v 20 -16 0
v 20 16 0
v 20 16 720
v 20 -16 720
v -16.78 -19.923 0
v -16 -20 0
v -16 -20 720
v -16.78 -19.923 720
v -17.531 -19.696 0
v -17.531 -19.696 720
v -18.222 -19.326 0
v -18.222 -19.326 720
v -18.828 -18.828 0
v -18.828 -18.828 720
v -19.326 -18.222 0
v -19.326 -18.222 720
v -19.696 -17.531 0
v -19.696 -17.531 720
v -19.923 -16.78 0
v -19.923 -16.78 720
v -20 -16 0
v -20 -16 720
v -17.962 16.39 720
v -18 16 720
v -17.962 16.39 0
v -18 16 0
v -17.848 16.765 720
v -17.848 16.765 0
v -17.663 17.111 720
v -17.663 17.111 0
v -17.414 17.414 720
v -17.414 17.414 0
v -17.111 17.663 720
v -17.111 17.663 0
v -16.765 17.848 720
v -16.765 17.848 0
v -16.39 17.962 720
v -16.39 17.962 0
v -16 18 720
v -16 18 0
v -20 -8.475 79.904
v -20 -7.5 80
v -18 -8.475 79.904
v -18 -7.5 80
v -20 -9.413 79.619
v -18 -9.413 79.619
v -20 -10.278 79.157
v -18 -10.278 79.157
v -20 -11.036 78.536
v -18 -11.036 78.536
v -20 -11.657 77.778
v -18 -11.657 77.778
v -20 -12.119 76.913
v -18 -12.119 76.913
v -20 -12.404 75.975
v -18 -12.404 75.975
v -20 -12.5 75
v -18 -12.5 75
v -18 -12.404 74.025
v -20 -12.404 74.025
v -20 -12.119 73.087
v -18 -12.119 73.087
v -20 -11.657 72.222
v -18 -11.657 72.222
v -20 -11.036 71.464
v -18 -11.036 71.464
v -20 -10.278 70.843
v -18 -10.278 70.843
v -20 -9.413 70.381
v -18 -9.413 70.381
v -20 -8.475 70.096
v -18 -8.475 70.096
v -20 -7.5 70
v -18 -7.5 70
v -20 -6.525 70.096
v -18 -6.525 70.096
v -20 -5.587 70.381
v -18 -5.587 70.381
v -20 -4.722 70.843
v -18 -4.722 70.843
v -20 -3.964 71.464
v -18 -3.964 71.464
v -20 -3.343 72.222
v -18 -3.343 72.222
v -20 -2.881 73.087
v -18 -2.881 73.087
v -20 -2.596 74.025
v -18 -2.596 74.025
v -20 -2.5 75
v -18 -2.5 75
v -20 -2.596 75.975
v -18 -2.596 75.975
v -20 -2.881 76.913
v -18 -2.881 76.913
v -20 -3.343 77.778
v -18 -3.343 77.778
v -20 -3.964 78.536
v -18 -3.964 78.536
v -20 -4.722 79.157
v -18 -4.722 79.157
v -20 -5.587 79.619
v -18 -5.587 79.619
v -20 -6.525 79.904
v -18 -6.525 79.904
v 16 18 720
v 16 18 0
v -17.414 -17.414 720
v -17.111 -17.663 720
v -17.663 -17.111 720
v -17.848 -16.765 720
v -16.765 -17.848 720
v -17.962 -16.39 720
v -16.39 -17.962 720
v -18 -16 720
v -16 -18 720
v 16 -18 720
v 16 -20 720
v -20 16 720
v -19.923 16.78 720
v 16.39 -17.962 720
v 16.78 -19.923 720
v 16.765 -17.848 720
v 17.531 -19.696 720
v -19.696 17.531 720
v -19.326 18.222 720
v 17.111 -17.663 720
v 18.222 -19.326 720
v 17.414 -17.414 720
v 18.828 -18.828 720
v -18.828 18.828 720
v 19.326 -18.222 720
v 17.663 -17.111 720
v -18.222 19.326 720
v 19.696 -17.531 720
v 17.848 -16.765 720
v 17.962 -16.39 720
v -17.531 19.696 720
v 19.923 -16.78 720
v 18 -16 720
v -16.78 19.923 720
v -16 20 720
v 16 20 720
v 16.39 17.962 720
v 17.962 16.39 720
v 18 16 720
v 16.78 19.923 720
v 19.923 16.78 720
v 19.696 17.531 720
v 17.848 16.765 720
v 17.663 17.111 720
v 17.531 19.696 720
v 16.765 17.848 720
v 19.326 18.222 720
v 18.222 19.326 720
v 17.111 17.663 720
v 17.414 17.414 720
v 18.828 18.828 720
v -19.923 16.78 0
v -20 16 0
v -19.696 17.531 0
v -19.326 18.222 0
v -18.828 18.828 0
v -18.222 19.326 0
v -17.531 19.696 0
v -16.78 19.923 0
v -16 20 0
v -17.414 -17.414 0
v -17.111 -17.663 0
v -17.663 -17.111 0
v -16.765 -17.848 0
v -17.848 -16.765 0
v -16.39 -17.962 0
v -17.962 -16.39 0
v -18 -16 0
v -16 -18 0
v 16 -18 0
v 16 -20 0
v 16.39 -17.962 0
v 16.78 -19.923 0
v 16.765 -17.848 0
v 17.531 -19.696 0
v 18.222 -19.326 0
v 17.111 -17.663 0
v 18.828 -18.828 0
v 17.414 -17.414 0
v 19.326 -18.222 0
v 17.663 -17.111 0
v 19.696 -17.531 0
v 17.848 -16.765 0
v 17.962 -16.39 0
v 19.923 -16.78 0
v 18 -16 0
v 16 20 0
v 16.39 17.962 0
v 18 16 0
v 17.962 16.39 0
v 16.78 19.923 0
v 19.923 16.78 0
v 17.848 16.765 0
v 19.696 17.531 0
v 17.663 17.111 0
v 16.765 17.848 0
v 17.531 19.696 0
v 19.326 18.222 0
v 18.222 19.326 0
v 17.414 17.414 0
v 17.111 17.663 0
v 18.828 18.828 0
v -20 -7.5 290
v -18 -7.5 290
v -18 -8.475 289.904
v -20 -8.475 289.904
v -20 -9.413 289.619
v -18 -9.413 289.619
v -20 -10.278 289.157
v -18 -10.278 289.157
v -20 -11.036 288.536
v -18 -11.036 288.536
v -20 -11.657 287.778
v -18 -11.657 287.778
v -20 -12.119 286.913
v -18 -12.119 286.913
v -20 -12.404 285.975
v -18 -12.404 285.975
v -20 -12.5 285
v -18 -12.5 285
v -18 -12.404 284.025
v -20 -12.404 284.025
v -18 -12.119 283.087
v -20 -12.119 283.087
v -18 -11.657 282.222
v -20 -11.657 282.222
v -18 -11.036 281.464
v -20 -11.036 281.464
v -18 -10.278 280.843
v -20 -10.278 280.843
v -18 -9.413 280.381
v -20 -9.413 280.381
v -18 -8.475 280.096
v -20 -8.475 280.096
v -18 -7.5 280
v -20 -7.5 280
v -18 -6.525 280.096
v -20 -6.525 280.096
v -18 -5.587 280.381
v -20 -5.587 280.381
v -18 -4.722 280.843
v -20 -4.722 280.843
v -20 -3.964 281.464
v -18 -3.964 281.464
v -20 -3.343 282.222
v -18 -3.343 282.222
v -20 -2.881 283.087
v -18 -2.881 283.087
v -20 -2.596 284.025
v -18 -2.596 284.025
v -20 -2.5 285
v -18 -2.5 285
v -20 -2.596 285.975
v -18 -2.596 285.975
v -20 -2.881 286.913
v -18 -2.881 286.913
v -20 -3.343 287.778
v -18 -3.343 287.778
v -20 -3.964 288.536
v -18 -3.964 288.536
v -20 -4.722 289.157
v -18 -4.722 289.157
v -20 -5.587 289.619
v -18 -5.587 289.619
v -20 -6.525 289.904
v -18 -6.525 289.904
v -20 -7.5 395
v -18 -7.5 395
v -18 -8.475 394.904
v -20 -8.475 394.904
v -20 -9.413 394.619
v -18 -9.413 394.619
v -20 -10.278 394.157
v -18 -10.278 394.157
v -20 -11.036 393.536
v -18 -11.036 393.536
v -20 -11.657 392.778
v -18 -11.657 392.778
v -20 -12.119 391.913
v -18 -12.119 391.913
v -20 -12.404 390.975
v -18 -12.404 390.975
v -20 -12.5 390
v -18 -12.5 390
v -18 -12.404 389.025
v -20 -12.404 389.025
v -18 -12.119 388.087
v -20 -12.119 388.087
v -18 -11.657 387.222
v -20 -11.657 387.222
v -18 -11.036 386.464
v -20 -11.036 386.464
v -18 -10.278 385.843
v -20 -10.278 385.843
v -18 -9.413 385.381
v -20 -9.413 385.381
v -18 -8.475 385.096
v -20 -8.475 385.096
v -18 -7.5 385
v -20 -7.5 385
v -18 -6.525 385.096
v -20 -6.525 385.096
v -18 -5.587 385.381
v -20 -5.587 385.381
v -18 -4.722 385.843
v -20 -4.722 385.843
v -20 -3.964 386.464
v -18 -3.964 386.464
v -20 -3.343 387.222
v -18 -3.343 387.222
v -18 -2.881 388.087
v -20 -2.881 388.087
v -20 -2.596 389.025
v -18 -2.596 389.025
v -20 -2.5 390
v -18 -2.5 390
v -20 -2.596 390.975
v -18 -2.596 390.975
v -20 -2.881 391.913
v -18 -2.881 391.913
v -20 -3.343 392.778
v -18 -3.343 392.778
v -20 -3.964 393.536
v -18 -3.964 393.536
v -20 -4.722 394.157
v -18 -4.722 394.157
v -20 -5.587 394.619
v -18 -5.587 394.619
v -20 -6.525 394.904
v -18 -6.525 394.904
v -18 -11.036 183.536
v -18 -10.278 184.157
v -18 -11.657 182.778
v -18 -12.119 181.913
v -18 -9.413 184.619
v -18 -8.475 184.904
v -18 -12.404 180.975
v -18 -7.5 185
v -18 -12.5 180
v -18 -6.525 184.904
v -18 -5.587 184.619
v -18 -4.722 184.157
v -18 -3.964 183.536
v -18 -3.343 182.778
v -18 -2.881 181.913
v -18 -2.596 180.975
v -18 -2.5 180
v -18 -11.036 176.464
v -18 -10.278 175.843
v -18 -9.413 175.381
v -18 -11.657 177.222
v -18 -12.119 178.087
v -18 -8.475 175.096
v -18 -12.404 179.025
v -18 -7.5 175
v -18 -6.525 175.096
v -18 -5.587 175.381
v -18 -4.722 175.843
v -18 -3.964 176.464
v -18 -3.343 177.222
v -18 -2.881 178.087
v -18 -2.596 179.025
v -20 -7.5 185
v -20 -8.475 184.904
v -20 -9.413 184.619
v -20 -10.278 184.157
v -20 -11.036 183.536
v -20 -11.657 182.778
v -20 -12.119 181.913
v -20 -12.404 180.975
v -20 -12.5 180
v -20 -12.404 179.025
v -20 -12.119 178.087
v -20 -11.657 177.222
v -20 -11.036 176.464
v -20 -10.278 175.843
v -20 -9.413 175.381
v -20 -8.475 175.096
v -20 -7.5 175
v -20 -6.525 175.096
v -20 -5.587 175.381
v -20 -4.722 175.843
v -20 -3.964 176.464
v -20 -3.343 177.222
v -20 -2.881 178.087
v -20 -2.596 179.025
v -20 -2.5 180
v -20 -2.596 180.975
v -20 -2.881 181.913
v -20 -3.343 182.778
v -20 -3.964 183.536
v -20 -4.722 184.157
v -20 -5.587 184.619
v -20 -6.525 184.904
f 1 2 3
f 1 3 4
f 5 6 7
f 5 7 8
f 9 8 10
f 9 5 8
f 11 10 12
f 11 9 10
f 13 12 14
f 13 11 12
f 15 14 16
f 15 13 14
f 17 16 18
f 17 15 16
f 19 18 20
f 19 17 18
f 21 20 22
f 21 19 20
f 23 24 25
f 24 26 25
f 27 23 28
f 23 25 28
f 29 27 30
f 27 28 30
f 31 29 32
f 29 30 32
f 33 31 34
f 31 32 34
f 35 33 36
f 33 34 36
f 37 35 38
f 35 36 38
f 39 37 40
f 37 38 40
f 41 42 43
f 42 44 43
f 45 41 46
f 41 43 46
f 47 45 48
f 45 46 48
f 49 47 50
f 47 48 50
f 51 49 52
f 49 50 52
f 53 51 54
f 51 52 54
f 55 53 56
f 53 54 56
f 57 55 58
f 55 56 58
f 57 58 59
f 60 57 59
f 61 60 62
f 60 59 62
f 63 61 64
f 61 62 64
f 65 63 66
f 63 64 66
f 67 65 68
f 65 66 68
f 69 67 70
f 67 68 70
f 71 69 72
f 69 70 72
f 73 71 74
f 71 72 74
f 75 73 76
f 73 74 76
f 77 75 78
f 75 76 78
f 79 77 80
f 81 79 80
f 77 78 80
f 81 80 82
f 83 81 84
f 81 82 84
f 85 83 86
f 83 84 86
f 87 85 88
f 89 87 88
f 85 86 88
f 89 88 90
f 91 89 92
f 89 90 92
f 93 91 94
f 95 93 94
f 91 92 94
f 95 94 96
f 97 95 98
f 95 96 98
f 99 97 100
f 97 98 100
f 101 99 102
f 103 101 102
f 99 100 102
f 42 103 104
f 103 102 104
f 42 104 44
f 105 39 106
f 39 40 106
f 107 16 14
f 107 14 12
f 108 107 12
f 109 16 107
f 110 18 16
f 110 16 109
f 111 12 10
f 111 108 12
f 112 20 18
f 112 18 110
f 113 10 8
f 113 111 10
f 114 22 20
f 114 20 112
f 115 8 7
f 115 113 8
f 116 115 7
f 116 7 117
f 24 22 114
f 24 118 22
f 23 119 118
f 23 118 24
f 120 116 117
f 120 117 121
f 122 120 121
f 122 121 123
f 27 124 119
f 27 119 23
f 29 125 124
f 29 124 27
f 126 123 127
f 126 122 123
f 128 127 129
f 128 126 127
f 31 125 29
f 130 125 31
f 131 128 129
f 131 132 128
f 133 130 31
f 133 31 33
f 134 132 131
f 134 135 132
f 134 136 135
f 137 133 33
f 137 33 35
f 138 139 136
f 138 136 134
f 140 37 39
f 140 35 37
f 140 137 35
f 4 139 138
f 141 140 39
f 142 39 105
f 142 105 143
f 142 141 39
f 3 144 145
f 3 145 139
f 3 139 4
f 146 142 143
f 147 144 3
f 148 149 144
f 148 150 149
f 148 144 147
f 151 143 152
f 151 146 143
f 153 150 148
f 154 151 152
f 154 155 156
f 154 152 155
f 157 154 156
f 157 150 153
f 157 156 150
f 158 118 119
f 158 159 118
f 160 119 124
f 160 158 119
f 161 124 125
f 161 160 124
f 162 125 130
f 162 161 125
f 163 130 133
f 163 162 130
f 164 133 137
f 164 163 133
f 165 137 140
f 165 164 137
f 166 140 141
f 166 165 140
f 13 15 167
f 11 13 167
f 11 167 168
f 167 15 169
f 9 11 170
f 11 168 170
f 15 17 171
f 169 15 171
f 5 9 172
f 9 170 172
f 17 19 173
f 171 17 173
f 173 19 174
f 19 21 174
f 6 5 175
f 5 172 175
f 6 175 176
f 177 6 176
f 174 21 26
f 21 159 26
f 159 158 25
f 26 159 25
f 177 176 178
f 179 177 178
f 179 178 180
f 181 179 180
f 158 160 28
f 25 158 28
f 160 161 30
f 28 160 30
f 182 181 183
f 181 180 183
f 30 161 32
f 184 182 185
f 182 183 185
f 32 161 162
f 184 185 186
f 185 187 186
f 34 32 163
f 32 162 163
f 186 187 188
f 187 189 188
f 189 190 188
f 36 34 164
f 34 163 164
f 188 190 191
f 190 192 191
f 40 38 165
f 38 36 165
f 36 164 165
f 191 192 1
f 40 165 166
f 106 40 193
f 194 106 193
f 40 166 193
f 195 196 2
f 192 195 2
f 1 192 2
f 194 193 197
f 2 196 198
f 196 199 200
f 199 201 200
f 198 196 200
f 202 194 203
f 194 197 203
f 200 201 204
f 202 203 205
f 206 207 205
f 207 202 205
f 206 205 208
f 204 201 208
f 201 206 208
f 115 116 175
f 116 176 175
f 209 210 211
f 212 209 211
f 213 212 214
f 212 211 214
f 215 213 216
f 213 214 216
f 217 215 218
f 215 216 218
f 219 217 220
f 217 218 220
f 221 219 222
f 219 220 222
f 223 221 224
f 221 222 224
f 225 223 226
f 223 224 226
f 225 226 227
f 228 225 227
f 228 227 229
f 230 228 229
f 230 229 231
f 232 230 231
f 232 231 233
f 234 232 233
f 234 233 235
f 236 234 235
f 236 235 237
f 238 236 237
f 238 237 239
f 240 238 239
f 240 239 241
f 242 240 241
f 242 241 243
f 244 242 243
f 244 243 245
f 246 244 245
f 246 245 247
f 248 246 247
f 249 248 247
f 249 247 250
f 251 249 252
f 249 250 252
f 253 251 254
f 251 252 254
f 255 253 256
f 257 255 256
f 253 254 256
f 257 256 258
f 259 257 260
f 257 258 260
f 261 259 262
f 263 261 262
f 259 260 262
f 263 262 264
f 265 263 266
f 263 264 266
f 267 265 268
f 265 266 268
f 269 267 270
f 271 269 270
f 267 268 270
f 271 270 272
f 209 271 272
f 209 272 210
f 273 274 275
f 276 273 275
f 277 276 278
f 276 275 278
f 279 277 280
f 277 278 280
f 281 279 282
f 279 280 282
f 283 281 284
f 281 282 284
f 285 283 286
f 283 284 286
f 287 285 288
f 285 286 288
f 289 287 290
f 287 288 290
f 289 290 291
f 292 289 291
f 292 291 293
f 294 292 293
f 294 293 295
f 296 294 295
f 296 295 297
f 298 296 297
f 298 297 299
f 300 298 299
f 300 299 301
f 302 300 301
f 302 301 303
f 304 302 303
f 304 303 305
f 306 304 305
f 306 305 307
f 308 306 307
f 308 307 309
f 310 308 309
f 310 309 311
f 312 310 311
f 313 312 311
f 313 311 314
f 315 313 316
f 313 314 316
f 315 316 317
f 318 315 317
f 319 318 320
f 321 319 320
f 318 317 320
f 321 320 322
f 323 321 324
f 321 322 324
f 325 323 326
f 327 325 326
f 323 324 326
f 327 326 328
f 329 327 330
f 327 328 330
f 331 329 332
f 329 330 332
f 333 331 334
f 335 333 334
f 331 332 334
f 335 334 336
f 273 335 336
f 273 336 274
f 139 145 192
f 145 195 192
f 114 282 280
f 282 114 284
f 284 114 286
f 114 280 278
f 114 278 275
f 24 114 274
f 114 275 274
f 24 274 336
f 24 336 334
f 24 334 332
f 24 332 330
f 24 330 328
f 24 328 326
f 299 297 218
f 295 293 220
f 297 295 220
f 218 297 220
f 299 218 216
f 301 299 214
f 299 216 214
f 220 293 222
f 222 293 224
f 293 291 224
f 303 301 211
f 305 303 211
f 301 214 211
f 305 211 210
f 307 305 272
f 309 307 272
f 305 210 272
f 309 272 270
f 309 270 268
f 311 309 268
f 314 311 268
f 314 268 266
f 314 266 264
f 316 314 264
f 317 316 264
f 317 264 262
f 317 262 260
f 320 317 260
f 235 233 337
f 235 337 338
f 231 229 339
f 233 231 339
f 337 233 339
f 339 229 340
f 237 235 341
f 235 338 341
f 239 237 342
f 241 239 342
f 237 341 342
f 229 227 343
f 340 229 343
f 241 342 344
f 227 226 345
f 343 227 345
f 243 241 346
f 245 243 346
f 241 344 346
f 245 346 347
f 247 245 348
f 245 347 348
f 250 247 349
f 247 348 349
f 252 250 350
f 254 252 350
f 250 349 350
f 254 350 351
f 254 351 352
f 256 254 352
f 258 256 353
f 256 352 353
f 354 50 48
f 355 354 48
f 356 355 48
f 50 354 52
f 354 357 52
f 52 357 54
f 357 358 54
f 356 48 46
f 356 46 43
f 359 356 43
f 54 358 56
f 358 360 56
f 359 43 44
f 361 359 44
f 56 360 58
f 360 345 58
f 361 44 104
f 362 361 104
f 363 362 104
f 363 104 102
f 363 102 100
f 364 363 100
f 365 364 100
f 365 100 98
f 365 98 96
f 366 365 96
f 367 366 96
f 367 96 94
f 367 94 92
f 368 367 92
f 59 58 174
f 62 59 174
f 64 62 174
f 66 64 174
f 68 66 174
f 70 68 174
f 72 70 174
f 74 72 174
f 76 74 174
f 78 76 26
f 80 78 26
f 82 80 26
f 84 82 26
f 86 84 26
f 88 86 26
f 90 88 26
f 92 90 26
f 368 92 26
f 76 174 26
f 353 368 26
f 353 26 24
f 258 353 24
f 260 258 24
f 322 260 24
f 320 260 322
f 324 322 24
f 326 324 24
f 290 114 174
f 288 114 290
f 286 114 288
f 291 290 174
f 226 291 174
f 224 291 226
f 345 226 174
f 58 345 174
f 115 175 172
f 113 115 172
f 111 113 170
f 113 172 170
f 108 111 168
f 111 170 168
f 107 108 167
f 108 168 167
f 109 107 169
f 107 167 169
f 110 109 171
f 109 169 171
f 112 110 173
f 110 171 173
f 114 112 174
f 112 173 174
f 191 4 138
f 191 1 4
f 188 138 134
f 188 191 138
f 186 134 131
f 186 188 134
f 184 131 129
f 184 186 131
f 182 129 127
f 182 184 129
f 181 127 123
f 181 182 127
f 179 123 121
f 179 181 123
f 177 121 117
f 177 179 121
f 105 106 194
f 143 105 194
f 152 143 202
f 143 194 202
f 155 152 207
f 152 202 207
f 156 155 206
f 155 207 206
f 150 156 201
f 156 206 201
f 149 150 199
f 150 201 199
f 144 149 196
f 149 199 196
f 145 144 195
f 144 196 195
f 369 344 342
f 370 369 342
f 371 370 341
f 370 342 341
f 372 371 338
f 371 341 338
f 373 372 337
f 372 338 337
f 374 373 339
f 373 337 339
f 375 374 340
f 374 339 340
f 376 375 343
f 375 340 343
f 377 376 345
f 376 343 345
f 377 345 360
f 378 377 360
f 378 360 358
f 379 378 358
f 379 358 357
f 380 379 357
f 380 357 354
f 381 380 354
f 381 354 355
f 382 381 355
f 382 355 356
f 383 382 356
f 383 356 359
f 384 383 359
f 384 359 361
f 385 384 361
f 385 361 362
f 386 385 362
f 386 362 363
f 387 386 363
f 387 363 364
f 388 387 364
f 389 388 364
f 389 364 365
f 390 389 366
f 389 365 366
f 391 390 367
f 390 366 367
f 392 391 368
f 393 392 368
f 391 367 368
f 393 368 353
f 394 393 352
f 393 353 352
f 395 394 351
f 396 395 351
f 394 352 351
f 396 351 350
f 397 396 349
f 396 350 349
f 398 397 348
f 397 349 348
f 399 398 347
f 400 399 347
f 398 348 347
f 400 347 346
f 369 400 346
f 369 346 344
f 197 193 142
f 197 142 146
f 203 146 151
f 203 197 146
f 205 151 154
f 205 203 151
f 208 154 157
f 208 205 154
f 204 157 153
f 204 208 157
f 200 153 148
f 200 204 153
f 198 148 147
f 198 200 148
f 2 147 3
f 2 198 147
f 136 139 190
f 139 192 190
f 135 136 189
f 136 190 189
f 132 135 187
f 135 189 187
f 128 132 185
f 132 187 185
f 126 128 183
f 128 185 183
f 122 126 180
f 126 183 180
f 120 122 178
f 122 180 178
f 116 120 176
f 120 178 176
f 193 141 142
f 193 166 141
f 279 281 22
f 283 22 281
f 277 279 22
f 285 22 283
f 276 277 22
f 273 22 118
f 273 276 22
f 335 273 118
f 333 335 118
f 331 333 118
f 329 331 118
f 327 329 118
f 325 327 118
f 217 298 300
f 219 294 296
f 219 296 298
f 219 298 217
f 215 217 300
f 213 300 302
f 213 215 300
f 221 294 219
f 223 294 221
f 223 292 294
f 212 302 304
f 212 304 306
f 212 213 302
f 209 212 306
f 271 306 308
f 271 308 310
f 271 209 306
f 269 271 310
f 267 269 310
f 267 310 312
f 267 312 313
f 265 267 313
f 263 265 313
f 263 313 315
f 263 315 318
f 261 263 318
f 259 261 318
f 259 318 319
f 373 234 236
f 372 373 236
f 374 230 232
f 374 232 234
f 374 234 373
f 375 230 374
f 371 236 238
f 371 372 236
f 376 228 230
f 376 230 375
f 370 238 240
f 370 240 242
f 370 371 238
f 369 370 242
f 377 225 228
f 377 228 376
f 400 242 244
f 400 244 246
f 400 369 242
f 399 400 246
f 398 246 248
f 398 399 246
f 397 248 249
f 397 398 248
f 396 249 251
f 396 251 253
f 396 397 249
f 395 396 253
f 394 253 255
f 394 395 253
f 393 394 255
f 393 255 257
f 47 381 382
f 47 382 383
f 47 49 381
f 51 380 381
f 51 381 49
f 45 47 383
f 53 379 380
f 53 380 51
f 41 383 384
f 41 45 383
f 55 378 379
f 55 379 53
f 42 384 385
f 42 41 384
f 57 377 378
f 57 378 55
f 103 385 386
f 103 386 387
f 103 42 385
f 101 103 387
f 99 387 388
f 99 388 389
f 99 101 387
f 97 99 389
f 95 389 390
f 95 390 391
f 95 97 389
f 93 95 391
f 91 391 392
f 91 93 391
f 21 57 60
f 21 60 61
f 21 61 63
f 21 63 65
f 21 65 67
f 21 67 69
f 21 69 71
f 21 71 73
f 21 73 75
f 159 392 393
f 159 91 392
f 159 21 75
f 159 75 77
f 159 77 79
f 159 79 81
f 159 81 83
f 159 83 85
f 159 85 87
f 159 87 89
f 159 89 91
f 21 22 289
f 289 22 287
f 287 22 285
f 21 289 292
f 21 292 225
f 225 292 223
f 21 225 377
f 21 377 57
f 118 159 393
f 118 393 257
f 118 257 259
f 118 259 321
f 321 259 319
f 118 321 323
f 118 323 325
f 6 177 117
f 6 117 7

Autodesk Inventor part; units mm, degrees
ref_plane "YZ Plane" through (0, 0, 0) normal (1, 0, 0) x (0, 1, 0)
ref_plane "Piano iniziale" through (0, 0, 0) normal (0, 0, 1) x (1, 0, 0)
ref_plane "Piano finale" through (0, 0, 720) normal (0, 0, 1) x (1, 0, 0)
sketch "Schizzo" plane through (0, 0, 0) normal (0, 0, 1) x (1, 0, 0)
  line L0 (-20, -16) -> (-20, 16)
  line L1 (-16, 20) -> (16, 20)
  line L2 (20, 16) -> (20, -16)
  line L3 (16, -20) -> (-16, -20)
  arc A0 (-20, -16) -> (-16, -20) centre (-16, -16) ccw
  arc A1 (20, 16) -> (16, 20) centre (16, 16) ccw
  arc A2 (-16, 20) -> (-20, 16) centre (-16, 16) ccw
  arc A3 (16, -20) -> (20, -16) centre (16, -16) ccw
  arc A4 (-16, 18) -> (-18, 16) centre (-16, 16) ccw
  line L4 (-16, 18) -> (16, 18)
  arc A5 (18, 16) -> (16, 18) centre (16, 16) ccw
  line L5 (18, 16) -> (18, -16)
  arc A6 (16, -18) -> (18, -16) centre (16, -16) ccw
  line L6 (16, -18) -> (-16, -18)
  arc A7 (-18, -16) -> (-16, -18) centre (-16, -16) ccw
  line L7 (-18, -16) -> (-18, 16)
  line L8 (0, 29.1598) -> (0, -29.1598) construction
  line L9 (-29.1598, 0) -> (29.1598, 0) construction
  dimension "d7" = 4
  dimension "d9" = 40
  dimension "d11" = 40
  dimension "d12" = 2
  dimension "d15" = 20
  dimension "d16" = 20
extrude "Corpo" add sketch "Schizzo" along normal up to surface (720 mm away) from surface at 0
sketch "Sketch3" plane through (0, 0, 0) normal (0, 0, 1) x (1, 0, 0)
  line L0 (0, 0) -> (10, 0)
ref_plane "Work Plane3" through (0, 0, 0) normal (0, -1, 0) x (1, 0, 0)
sketch "Sketch4" plane through (0, 0, 0) normal (0, -1, 0) x (1, 0, 0)
  line L0 (-2, 0) -> (12, 0)
  line L1 (-2, 720) -> (12, 720)
  dimension "d18" = 720
sketch "Schizzo5" plane through (-20, 16, 0) normal (-1, 0, 0) x (0, 0, 1)
  line L0 (0, -36) -> (720, -36) projected
  line L1 (0, -32) -> (0, 0) projected
  point P0 (0, -16)
  point P1 (75, -23.5)
  point P2 (285, -23.5)
  point P3 (390, -23.5)
  point P4 (180, -23.5)
  dimension "d22" = 105
  dimension "d30" = 12.5
  dimension "d31" = 75
  dimension "d32" = 105
  dimension "d33" = 105
hole "Foro1" at (-20, -7.5, 75) at (-20, -7.5, 285) at (-20, -7.5, 390) at (-20, -7.5, 180) direction (1, 0, 0) diameter 10 depth 5 tip angle 118
equation "\"d7\" = G_IR"
equation "\"d9\" = G_W"
equation "\"d11\" = G_H"
equation "\"d12\" = G_T"
equation "\"d15\" = 0.5 * d9"
equation "\"d16\" = 0.5 * d11"
equation "\"d3\" = G_L"
equation "\"G_W\" = 40"
equation "\"G_H\" = 40"
equation "\"G_T\" = 2"
equation "\"G_IR\" = 4"
equation "\"G_L\" = d18"
equation "\"G_OFFSET_START\" = 0"
equation "\"G_OFFSET_END\" = 0"
properties part number "ISO 10799-2 - 40x40x2 - 720" material "Acciaio, Dolce"
